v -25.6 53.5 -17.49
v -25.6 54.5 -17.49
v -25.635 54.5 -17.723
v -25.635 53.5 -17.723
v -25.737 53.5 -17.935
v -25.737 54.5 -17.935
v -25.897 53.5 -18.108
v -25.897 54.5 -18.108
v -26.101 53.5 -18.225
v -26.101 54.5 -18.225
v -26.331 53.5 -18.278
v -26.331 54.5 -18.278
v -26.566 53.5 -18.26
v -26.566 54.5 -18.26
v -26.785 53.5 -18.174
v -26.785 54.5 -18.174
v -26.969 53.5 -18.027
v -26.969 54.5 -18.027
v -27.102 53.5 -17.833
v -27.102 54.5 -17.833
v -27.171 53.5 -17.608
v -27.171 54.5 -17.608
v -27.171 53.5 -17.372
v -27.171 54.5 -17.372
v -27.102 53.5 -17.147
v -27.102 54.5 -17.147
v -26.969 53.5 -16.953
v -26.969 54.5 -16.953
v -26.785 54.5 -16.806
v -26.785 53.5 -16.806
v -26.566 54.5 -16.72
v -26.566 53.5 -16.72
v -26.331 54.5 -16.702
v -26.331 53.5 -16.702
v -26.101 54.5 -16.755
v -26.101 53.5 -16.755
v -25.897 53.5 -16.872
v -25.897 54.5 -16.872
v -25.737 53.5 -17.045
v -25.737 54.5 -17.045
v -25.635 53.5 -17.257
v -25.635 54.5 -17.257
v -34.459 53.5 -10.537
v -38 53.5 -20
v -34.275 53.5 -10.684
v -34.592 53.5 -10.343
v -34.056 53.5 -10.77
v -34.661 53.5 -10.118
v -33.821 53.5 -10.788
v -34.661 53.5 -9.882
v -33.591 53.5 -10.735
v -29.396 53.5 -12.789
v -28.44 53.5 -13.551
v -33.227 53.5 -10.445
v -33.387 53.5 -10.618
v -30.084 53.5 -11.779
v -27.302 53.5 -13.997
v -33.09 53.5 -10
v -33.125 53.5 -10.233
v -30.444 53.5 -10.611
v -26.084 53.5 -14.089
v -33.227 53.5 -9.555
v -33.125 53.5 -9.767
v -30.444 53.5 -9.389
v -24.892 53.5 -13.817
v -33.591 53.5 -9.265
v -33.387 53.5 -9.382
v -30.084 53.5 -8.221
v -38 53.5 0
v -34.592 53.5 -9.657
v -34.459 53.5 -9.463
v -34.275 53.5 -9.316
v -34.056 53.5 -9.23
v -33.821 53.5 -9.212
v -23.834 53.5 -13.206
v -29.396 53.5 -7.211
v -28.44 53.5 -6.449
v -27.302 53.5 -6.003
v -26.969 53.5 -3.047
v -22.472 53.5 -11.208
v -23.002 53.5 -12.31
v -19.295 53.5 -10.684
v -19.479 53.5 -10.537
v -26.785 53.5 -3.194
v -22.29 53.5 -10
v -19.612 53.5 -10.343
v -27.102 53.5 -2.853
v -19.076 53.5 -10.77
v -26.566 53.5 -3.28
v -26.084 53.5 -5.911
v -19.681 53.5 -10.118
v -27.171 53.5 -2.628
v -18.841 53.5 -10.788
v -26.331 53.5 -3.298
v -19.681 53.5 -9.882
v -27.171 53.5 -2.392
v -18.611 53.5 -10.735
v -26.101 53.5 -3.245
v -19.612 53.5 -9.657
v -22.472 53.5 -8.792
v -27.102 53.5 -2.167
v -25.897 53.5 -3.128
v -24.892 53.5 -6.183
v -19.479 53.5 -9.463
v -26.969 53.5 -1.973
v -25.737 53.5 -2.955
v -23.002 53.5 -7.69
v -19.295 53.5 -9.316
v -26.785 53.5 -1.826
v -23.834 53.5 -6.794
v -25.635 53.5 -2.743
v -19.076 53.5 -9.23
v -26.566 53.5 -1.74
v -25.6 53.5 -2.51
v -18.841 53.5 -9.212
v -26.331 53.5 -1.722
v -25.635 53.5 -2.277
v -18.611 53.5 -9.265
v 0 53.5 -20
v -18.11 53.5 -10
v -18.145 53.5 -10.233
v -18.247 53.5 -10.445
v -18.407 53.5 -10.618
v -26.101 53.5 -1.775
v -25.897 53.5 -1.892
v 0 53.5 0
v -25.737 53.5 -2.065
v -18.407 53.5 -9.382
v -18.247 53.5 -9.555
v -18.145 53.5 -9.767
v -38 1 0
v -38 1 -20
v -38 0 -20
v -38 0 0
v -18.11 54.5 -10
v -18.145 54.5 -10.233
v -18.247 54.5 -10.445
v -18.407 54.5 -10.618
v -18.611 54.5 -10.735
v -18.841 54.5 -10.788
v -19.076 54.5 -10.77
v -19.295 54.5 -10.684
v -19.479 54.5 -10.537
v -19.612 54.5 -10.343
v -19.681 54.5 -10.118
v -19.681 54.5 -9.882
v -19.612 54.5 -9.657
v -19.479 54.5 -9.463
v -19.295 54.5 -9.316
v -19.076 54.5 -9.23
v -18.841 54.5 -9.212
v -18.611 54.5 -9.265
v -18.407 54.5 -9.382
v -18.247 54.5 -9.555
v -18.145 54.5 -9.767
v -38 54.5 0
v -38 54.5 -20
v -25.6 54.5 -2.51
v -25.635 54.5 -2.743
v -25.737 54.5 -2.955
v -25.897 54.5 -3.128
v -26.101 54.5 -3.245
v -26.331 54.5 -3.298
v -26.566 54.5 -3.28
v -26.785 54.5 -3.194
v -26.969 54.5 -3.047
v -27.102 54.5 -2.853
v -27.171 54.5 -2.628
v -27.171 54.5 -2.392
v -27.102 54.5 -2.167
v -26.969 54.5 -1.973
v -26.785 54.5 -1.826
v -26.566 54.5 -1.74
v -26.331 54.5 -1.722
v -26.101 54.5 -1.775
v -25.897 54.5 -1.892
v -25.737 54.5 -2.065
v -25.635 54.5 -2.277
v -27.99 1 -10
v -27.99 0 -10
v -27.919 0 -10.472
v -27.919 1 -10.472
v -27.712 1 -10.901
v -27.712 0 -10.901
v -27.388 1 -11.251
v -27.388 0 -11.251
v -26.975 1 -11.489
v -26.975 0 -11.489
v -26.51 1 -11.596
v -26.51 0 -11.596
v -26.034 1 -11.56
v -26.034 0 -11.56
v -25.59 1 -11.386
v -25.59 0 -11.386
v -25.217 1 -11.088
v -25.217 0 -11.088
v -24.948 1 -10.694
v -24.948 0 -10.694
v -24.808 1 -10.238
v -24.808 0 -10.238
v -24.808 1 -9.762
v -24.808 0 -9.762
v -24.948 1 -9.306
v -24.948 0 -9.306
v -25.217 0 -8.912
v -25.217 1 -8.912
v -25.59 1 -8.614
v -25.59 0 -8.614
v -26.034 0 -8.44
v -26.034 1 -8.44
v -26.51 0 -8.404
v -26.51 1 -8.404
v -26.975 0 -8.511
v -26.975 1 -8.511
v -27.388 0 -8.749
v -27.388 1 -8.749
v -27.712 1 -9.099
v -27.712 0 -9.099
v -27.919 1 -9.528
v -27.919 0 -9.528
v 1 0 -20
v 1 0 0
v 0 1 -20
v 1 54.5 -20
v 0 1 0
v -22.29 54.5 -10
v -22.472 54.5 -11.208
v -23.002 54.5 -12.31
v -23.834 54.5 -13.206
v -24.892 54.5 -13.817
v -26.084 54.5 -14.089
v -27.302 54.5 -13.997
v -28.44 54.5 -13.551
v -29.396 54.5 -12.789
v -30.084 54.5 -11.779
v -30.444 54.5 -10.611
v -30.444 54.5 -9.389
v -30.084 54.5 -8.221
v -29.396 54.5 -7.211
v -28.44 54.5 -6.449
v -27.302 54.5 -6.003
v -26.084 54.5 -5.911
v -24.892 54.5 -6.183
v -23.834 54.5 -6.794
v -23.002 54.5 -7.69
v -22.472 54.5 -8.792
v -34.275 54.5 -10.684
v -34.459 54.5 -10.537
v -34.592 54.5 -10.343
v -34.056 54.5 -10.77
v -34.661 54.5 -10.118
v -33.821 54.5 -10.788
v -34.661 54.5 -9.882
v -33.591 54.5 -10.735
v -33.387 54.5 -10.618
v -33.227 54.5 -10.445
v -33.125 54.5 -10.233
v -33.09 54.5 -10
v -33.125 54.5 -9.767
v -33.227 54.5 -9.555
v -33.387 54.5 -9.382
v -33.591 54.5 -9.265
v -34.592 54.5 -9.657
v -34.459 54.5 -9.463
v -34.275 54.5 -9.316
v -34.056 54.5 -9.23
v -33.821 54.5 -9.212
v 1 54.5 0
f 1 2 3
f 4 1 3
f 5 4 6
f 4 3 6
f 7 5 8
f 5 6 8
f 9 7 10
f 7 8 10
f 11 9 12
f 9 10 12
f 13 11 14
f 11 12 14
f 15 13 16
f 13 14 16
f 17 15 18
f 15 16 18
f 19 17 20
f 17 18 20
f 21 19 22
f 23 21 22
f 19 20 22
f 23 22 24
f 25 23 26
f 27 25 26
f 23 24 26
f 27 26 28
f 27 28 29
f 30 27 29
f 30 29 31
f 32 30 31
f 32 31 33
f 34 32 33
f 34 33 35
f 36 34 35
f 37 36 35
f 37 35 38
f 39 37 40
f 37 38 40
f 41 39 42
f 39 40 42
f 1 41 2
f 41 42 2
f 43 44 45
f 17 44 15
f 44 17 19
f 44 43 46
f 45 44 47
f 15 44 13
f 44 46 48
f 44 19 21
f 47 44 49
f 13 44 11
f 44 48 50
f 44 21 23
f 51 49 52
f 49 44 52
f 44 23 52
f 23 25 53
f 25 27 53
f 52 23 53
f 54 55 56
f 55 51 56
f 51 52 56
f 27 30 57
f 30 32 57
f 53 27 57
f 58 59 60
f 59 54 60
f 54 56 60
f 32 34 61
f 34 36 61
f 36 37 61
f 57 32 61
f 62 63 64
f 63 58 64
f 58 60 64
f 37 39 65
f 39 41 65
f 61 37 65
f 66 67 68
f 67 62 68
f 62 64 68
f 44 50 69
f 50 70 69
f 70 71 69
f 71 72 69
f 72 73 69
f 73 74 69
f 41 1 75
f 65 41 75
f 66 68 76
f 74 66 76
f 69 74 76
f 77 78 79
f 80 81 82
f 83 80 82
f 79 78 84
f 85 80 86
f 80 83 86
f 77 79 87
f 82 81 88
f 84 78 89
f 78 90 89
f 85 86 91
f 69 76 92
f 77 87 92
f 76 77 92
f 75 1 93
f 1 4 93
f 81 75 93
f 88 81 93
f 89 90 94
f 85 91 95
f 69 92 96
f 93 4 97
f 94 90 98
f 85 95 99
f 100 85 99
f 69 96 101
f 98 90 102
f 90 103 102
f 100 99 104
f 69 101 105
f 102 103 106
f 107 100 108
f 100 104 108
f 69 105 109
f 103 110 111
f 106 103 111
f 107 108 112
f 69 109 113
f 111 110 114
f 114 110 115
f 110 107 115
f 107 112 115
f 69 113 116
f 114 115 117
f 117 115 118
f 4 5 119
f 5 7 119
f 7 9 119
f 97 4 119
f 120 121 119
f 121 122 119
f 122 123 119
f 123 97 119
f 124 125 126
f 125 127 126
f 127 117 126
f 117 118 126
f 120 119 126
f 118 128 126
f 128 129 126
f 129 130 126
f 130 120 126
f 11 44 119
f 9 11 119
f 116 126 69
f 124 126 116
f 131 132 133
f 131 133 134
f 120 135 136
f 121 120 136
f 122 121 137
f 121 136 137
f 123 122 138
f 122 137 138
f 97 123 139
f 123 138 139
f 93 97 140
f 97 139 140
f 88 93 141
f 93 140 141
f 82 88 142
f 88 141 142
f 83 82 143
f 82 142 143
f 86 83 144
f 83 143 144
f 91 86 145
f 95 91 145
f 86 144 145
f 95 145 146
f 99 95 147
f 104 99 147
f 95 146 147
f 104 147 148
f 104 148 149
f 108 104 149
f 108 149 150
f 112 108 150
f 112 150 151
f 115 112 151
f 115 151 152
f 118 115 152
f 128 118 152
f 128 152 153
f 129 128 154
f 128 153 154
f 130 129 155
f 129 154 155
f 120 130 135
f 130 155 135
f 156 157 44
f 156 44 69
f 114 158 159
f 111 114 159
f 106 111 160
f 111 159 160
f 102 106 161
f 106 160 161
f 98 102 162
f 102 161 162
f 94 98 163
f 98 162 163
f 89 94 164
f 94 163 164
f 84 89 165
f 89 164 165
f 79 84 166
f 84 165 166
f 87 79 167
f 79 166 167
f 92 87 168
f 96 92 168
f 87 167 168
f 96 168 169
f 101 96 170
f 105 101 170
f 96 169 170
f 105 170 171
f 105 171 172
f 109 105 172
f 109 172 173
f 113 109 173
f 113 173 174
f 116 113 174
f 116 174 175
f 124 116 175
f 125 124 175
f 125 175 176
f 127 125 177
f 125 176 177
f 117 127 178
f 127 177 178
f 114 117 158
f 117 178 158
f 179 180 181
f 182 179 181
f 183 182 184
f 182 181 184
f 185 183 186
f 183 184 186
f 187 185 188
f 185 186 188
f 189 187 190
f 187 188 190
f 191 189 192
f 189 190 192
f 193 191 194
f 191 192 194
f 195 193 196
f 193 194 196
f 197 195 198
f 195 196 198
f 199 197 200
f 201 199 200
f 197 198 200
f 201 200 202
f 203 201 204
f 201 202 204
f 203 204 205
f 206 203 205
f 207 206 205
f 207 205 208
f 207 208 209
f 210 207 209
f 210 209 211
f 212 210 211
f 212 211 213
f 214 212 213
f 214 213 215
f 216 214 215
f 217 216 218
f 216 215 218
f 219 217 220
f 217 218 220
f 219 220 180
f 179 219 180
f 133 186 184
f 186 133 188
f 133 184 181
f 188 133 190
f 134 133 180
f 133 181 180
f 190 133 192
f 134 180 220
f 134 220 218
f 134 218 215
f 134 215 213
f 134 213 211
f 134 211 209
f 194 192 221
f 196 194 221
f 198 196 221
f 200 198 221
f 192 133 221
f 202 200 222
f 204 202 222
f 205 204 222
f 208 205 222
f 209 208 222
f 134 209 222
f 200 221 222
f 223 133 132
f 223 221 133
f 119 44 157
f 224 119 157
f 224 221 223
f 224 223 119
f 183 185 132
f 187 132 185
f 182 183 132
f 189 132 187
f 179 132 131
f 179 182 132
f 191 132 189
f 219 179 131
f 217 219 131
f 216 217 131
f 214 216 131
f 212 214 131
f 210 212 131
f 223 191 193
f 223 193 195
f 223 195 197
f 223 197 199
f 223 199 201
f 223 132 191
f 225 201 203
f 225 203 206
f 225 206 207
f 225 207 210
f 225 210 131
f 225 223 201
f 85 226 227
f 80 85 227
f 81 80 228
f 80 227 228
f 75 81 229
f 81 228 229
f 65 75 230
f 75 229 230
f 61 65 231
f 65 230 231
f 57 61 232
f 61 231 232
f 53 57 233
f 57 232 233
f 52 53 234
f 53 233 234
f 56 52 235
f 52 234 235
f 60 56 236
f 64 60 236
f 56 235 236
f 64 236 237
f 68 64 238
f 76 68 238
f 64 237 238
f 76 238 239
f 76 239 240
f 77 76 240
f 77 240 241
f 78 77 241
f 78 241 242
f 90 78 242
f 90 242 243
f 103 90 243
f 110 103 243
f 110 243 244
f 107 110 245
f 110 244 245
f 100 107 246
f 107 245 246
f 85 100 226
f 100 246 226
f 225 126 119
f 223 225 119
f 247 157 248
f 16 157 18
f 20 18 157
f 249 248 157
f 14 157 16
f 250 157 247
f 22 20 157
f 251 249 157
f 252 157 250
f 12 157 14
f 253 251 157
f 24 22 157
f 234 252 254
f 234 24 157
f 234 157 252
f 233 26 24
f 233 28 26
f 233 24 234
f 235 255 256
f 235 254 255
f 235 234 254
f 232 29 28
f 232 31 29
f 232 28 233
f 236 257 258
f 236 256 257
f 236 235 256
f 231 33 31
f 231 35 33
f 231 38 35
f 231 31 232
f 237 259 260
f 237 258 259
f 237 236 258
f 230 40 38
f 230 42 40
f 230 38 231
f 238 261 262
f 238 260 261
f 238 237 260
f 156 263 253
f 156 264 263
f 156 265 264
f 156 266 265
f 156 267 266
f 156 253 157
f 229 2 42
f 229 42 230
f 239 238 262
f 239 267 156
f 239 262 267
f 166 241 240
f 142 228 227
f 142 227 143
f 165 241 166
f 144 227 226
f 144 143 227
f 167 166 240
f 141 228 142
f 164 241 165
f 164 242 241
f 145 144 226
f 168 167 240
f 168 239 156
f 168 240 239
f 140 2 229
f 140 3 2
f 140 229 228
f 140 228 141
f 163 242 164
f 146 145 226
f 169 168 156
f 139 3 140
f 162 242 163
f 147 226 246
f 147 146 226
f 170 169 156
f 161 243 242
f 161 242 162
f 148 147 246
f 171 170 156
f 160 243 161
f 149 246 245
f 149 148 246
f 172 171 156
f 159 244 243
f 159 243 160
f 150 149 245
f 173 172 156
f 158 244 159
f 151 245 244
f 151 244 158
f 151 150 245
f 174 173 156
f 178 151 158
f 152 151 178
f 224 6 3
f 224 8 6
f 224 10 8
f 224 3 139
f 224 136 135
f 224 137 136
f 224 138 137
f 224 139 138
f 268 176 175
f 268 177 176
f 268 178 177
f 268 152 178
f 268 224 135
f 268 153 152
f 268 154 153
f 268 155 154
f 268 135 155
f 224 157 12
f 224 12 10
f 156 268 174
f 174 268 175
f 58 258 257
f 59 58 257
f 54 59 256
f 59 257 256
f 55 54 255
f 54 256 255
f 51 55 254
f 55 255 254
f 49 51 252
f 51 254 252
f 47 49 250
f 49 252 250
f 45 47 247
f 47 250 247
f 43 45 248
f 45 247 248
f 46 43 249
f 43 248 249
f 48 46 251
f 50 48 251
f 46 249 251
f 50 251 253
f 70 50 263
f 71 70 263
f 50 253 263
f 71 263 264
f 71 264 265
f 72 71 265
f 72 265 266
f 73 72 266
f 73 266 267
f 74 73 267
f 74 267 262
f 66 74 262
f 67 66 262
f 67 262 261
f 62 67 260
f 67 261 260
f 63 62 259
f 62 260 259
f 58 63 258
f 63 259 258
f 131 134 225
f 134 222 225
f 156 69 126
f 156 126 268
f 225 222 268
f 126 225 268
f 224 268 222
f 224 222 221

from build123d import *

# Parameters (mm, degrees)
SKETCH_1_W          = 20
SKETCH_1_H          = 54.5
EXTRUDE_1_DEPTH     = 1
SKETCH_2_W          = 20
SKETCH_2_H          = 1
EXTRUDE_2_DEPTH     = 38
SKETCH_3_W          = 20
SKETCH_3_H          = 1
EXTRUDE_3_DEPTH     = 38
SKETCH_4_R          = 4.1
CUT_EXTRUDE_1_DEPTH = 1
SKETCH_5_R          = 0.79
CUT_EXTRUDE_2_DEPTH = 1
SKETCH_6_R          = 0.79
CUT_EXTRUDE_3_DEPTH = 1
SKETCH_7_R          = 0.79
CUT_EXTRUDE_4_DEPTH = 1
SKETCH_8_R          = 0.79
CUT_EXTRUDE_5_DEPTH = 1
SKETCH_9_R          = 1.6
CUT_EXTRUDE_6_DEPTH = 1


with BuildPart() as part:
    # ｽｹｯﾁ1 → ﾎﾞｽ - 押し出し1 (new body)
    with BuildSketch(Plane(origin=(0, 0, 0), x_dir=(0, 0, -1), z_dir=(1, 0, 0))):
        with Locations((10, 27.25)):
            Rectangle(SKETCH_1_W, SKETCH_1_H)
    extrude(amount=EXTRUDE_1_DEPTH)

    # ｽｹｯﾁ2 → ﾎﾞｽ - 押し出し2 (add)
    with BuildSketch(Plane.ZY):
        with Locations((-10, 54)):
            Rectangle(SKETCH_2_W, SKETCH_2_H)
    extrude(amount=EXTRUDE_2_DEPTH)

    # ｽｹｯﾁ3 → ﾎﾞｽ - 押し出し3 (add)
    with BuildSketch(Plane.ZY):
        with Locations((-10, 0.5)):
            Rectangle(SKETCH_3_W, SKETCH_3_H)
    extrude(amount=EXTRUDE_3_DEPTH)

    # ｽｹｯﾁ4 → ｶｯﾄ - 押し出し1 (cut)
    with BuildSketch(Plane(origin=(0, 54.5, 0), x_dir=(1, 0, 0), z_dir=(0, 1, 0))):
        with Locations((-26.39, 10)):
            Circle(SKETCH_4_R)
    extrude(amount=-CUT_EXTRUDE_1_DEPTH, mode=Mode.SUBTRACT)

    # ｽｹｯﾁ5 → ｶｯﾄ - 押し出し2 (cut)
    with BuildSketch(Plane(origin=(0, 54.5, 0), x_dir=(1, 0, 0), z_dir=(0, 1, 0))):
        with Locations((-33.88, 10)):
            Circle(SKETCH_5_R)
    extrude(amount=-CUT_EXTRUDE_2_DEPTH, mode=Mode.SUBTRACT)

    # ｽｹｯﾁ6 → ｶｯﾄ - 押し出し3 (cut)
    with BuildSketch(Plane(origin=(0, 54.5, 0), x_dir=(1, 0, 0), z_dir=(0, 1, 0))):
        with Locations((-18.9, 10)):
            Circle(SKETCH_6_R)
    extrude(amount=-CUT_EXTRUDE_3_DEPTH, mode=Mode.SUBTRACT)

    # ｽｹｯﾁ7 → ｶｯﾄ - 押し出し4 (cut)
    with BuildSketch(Plane(origin=(0, 54.5, 0), x_dir=(1, 0, 0), z_dir=(0, 1, 0))):
        with Locations((-26.39, 2.51)):
            Circle(SKETCH_7_R)
    extrude(amount=-CUT_EXTRUDE_4_DEPTH, mode=Mode.SUBTRACT)

    # ｽｹｯﾁ8 → ｶｯﾄ - 押し出し5 (cut)
    with BuildSketch(Plane(origin=(0, 54.5, 0), x_dir=(1, 0, 0), z_dir=(0, 1, 0))):
        with Locations((-26.39, 17.49)):
            Circle(SKETCH_8_R)
    extrude(amount=-CUT_EXTRUDE_5_DEPTH, mode=Mode.SUBTRACT)

    # ｽｹｯﾁ9 → ｶｯﾄ - 押し出し6 (cut)
    with BuildSketch(Plane(origin=(0, 0, 0), x_dir=(-1, 0, 0), z_dir=(0, -1, 0))):
        with Locations((26.39, 10)):
            Circle(SKETCH_9_R)
    extrude(amount=-CUT_EXTRUDE_6_DEPTH, mode=Mode.SUBTRACT)


solid = part.part
